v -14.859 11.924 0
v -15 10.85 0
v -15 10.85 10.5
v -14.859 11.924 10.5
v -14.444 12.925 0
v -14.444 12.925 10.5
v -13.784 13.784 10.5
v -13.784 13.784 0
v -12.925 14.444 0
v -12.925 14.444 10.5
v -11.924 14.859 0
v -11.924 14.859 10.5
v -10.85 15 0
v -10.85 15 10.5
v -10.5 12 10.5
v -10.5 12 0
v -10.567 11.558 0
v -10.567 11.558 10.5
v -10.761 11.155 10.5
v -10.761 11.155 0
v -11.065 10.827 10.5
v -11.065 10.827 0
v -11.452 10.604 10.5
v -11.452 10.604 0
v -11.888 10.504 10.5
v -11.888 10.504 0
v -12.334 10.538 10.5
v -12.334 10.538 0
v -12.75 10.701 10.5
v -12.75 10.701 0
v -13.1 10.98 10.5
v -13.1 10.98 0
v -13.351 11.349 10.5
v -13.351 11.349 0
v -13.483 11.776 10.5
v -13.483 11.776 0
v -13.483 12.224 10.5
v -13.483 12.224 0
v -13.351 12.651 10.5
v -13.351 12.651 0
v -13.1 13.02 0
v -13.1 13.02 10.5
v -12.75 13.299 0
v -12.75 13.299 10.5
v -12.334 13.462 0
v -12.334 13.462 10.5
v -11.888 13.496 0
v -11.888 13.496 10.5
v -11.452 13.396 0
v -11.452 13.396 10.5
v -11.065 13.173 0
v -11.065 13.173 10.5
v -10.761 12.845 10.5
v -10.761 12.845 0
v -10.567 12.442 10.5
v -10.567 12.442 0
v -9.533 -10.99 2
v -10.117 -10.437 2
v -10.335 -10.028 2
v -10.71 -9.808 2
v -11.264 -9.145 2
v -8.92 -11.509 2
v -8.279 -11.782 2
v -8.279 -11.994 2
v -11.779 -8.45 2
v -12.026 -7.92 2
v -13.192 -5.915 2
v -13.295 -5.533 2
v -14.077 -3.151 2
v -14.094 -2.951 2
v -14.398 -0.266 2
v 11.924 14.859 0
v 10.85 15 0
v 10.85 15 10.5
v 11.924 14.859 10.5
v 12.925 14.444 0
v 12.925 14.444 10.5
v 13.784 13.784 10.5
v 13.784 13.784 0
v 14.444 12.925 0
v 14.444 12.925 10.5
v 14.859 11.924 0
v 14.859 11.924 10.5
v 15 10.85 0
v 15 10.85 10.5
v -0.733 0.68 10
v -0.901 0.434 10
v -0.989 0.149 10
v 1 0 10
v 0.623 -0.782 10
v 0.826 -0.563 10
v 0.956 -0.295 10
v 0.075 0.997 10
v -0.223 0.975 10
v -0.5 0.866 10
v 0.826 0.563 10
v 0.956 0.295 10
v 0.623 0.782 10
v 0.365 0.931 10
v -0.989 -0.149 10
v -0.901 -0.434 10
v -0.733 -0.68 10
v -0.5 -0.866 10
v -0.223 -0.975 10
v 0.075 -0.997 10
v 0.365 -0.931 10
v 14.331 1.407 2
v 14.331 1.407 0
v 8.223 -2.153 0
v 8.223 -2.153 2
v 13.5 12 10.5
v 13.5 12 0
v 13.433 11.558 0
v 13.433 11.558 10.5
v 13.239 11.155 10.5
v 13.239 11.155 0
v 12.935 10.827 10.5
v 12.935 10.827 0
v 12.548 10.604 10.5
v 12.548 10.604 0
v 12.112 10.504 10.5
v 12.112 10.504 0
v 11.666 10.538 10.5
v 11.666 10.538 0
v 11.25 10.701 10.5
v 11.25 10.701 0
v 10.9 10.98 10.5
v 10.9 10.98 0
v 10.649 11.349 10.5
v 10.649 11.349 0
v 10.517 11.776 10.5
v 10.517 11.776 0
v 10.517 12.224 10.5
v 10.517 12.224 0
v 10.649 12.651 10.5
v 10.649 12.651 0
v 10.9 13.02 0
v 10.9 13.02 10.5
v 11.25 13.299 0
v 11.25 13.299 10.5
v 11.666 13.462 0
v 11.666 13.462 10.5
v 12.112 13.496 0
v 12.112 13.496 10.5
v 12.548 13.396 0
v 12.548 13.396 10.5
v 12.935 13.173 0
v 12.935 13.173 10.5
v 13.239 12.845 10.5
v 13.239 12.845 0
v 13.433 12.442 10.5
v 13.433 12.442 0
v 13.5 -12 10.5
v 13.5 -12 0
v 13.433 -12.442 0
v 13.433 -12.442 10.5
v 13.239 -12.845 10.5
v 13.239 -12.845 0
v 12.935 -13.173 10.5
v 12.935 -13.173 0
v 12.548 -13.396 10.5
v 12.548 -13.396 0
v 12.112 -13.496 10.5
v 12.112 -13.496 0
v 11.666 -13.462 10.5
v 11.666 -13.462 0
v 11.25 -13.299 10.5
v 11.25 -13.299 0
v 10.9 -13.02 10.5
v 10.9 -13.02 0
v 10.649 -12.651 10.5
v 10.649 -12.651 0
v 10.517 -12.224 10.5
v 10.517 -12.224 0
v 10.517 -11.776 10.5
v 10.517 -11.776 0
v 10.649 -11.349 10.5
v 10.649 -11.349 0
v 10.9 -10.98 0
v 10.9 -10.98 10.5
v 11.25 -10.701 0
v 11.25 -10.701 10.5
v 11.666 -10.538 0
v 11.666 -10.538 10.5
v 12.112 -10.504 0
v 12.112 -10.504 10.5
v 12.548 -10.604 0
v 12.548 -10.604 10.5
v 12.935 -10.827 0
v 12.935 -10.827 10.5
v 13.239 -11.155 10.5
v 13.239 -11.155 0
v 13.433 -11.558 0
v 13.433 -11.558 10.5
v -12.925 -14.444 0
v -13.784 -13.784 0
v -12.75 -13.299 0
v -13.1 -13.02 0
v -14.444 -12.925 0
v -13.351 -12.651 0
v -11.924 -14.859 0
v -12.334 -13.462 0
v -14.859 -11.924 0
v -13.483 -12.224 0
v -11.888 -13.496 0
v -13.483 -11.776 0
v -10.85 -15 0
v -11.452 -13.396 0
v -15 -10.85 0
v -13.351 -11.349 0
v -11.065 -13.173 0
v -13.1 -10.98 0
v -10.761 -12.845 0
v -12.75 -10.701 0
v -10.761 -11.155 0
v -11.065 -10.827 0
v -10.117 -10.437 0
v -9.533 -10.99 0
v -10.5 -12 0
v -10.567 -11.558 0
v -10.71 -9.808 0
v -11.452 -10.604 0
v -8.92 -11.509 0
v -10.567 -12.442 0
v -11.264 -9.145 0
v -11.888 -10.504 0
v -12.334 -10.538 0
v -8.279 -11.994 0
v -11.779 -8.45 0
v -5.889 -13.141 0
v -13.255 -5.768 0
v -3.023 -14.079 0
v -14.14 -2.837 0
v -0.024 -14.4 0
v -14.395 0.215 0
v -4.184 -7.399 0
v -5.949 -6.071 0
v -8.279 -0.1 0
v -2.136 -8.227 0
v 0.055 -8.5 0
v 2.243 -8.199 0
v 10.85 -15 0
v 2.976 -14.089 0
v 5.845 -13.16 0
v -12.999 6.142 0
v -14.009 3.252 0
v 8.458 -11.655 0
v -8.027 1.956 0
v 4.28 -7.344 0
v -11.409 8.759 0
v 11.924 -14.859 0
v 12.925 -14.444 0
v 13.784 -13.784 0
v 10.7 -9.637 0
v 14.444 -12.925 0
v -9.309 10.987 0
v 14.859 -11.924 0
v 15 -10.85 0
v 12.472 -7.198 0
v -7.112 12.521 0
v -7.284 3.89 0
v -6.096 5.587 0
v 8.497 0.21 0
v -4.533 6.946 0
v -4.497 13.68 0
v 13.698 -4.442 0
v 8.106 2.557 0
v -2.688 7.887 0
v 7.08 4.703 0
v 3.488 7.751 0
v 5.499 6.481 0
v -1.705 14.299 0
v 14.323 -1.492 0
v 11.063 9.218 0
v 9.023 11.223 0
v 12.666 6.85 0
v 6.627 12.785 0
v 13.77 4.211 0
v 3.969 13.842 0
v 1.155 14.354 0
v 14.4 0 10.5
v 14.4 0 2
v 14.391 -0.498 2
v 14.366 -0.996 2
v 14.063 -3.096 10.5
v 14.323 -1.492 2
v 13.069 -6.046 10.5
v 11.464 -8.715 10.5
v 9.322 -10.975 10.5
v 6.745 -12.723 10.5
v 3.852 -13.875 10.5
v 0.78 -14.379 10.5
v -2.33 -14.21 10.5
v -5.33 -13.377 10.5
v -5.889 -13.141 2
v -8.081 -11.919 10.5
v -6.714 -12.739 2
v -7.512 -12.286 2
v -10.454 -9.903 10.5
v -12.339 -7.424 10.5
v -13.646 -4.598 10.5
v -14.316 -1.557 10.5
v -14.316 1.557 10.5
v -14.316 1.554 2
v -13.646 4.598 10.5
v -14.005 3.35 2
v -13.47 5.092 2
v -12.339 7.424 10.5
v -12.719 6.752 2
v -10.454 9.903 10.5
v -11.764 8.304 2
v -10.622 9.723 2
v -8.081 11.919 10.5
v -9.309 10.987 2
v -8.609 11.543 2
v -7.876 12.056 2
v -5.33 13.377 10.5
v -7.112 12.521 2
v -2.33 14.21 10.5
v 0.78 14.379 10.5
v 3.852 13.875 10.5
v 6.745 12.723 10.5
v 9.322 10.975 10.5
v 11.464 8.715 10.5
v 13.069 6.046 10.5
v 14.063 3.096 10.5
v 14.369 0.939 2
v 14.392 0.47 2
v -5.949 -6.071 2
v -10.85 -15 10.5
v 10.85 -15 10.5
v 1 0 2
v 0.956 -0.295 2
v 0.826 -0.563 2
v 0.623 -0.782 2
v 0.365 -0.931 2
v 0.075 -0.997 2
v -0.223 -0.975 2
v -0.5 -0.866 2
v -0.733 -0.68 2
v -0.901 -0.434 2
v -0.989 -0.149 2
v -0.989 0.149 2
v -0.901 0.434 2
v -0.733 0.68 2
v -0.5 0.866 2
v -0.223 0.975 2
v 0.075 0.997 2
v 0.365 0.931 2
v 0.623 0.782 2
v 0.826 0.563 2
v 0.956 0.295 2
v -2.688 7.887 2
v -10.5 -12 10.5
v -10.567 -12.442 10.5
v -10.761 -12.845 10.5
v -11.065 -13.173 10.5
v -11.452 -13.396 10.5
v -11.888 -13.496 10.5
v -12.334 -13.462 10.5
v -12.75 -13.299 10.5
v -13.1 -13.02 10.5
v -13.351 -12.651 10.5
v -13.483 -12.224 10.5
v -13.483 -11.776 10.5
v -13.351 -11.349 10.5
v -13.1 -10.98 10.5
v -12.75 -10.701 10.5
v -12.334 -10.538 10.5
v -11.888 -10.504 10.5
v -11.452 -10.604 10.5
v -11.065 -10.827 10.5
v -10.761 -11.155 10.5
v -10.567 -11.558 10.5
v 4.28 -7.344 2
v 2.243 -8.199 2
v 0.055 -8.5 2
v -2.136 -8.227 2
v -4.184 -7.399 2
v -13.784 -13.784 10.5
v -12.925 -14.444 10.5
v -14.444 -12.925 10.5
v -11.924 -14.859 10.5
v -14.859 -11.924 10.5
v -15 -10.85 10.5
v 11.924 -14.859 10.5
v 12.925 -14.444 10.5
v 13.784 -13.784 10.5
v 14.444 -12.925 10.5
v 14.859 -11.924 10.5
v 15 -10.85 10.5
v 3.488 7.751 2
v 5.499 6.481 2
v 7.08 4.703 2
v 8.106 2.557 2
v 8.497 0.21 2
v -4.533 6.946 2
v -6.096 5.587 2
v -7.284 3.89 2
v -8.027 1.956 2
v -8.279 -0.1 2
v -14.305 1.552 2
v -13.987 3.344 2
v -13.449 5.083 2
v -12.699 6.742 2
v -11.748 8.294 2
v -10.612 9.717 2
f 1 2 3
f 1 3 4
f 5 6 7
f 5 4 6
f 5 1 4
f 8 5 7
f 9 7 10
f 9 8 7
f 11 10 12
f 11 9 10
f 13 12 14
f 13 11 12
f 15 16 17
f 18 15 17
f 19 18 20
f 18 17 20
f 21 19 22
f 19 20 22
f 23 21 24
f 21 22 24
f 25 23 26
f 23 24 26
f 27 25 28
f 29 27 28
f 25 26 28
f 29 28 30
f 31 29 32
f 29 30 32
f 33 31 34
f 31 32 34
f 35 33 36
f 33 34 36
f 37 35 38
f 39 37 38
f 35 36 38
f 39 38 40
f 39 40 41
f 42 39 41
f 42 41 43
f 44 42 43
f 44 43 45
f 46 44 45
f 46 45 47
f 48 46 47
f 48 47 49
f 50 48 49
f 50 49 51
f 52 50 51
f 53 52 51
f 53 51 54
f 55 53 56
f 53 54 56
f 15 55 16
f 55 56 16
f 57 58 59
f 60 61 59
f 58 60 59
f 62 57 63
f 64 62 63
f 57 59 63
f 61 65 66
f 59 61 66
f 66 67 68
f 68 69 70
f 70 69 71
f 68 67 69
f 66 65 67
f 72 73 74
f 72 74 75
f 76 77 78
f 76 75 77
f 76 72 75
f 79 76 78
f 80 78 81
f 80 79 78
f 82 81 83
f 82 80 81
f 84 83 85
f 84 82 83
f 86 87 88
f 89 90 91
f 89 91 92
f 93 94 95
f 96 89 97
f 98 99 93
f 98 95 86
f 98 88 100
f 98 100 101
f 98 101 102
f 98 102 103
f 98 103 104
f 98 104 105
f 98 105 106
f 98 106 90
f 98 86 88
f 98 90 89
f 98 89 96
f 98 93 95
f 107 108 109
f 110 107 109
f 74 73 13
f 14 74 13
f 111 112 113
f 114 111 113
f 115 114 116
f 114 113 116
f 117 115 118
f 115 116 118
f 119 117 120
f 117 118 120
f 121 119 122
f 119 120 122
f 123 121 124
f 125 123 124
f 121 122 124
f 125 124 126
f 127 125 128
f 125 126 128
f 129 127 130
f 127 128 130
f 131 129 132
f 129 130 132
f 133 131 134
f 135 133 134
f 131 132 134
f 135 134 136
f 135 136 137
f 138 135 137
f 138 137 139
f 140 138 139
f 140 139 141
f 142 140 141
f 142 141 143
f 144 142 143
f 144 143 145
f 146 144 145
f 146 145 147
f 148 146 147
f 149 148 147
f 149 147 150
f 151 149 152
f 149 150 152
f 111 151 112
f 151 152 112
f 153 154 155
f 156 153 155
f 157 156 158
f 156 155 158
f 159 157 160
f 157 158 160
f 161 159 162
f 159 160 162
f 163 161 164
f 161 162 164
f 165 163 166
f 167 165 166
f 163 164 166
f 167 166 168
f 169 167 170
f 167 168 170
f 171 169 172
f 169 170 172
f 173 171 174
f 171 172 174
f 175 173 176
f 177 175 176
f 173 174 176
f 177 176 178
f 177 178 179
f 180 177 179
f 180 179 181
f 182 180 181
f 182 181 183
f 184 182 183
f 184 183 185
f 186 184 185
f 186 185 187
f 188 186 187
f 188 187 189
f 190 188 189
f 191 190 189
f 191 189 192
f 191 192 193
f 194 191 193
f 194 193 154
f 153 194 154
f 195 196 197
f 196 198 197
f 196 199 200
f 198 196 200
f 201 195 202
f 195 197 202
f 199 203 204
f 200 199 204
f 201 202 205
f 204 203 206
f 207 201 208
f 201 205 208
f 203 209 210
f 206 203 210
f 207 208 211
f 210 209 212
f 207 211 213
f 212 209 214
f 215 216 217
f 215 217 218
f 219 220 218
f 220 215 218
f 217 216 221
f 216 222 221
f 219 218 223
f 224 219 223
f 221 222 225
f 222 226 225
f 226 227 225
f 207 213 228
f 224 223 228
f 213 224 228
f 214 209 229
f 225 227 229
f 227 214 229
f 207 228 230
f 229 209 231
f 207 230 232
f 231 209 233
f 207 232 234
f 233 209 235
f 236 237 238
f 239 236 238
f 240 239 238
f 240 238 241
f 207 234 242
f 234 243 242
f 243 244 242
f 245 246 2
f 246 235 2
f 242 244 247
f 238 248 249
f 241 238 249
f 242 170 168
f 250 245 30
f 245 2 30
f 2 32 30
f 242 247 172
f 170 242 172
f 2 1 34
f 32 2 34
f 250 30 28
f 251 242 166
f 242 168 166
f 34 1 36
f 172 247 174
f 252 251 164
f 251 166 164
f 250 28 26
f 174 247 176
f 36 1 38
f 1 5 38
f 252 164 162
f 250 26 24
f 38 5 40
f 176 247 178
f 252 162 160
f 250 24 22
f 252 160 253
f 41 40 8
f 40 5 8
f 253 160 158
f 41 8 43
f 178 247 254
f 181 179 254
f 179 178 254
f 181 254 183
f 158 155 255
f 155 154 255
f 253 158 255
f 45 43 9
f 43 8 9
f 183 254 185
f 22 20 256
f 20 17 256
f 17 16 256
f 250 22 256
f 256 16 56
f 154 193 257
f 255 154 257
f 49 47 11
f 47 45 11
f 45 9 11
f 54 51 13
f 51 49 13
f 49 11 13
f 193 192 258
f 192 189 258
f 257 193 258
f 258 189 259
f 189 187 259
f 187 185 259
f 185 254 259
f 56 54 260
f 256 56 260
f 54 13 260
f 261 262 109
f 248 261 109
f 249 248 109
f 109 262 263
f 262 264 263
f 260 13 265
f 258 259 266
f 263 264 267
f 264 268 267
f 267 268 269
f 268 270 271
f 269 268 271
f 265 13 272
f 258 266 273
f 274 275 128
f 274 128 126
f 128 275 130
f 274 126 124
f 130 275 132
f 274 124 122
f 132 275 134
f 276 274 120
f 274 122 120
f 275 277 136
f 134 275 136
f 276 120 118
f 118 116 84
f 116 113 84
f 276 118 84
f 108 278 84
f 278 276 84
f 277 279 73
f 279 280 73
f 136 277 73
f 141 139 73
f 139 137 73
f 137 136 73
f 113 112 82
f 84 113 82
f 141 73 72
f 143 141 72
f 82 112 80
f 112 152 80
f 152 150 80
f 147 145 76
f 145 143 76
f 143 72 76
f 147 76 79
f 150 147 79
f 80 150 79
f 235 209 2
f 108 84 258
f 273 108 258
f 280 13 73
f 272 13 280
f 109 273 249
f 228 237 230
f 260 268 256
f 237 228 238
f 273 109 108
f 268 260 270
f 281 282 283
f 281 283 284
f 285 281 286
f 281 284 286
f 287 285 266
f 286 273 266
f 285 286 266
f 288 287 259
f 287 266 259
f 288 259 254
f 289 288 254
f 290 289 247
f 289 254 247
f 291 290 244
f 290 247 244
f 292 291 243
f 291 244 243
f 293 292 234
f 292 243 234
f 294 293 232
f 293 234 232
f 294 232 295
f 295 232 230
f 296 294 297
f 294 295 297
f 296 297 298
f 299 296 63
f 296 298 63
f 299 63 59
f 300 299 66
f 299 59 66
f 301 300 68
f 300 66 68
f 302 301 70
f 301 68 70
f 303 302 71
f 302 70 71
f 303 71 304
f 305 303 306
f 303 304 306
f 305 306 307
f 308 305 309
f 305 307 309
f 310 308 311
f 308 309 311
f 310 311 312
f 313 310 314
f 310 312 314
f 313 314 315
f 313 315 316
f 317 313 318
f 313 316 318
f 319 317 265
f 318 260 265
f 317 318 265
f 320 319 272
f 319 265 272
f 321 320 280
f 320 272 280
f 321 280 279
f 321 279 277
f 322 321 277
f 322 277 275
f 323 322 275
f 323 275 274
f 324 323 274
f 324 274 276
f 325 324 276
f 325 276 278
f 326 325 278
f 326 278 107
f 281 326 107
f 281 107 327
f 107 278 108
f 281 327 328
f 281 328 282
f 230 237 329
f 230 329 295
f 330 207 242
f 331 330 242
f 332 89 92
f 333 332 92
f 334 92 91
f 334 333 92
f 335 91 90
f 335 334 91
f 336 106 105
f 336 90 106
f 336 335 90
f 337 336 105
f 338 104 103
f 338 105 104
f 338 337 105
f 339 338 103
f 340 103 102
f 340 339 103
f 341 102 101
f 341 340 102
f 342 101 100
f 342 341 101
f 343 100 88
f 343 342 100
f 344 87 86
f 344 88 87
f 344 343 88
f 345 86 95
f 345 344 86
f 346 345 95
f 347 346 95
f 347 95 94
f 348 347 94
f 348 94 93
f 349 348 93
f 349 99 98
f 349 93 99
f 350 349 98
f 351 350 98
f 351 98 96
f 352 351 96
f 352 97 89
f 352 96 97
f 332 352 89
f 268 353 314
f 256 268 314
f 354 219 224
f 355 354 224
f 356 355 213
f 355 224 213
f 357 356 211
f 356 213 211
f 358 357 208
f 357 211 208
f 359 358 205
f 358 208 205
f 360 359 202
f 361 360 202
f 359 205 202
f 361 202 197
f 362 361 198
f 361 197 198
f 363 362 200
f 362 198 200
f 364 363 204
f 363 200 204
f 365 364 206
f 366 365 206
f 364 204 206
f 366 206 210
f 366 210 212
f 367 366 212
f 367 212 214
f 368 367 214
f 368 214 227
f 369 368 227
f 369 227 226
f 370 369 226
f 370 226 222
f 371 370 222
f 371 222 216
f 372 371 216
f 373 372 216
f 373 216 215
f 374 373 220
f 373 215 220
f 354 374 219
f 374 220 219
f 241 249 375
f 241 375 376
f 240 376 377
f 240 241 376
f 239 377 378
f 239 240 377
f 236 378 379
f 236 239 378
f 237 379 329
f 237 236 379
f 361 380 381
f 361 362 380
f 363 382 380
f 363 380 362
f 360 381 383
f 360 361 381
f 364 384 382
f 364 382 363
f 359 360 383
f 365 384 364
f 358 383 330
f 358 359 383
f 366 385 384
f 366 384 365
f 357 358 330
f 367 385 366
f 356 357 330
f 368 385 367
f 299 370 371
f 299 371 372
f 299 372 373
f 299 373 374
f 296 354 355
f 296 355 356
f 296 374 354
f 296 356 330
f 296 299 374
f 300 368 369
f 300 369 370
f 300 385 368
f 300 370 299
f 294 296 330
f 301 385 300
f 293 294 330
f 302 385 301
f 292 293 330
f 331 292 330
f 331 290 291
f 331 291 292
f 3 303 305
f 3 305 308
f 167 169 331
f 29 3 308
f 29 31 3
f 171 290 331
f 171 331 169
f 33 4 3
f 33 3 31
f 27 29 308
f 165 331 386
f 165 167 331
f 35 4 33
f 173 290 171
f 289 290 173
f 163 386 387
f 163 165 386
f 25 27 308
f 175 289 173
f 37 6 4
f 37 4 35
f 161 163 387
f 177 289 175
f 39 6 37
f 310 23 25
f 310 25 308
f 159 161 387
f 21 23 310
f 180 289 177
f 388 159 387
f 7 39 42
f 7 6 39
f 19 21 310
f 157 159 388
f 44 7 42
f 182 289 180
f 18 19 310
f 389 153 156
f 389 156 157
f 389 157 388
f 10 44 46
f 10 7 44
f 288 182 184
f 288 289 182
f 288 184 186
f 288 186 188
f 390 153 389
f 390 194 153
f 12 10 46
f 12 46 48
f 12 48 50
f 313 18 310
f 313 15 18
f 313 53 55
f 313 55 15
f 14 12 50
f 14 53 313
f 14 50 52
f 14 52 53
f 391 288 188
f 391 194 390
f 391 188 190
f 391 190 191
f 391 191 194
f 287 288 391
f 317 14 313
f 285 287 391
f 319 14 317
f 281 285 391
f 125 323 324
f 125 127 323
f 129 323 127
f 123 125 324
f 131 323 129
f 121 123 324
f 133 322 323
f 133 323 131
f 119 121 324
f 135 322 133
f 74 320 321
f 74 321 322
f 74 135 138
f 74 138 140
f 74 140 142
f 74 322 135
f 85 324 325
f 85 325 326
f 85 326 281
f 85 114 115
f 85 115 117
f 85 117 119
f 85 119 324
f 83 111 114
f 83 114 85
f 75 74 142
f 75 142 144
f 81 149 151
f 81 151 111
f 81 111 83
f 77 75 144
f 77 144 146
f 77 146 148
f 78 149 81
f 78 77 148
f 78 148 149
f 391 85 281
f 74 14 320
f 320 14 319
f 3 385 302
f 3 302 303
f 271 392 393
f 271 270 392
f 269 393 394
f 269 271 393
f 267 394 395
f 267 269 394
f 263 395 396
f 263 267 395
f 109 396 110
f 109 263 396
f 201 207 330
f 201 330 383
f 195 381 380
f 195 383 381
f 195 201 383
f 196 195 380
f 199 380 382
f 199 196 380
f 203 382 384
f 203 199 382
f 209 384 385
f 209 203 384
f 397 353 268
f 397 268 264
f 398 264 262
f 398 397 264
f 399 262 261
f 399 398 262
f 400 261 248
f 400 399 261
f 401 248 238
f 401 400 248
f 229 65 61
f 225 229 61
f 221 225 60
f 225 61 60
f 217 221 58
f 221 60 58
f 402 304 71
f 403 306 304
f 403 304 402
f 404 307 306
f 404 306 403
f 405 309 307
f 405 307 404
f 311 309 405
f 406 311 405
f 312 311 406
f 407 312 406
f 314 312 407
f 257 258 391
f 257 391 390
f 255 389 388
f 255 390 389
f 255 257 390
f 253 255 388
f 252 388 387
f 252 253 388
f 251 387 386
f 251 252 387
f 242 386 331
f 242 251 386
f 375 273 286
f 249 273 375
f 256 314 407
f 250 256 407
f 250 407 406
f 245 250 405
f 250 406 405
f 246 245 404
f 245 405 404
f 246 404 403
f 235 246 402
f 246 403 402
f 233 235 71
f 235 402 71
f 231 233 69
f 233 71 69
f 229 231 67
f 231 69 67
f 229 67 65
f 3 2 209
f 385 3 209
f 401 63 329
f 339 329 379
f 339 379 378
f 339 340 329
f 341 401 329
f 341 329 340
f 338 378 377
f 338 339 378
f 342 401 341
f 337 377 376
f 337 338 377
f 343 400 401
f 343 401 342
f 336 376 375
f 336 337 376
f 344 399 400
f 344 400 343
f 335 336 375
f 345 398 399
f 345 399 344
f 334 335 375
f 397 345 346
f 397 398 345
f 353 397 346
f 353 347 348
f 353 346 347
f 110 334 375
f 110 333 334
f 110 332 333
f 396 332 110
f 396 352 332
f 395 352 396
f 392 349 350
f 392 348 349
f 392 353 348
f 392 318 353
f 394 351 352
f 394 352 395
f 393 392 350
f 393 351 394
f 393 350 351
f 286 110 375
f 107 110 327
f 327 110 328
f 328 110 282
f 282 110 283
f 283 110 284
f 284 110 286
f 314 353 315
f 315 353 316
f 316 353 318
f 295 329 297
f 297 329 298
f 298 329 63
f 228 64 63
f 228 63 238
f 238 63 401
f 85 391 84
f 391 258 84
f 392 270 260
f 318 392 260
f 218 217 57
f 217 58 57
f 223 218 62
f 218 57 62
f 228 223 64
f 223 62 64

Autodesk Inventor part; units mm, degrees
ref_plane "YZ Plane" through (0, 0, 0) normal (1, 0, 0) x (0, 1, 0)
ref_plane "XZ Plane" through (0, 0, 0) normal (0, 1, 0) x (-1, 0, 0)
ref_plane "XY Plane" through (0, 0, 0) normal (0, 0, 1) x (1, 0, 0)
sketch "Эскиз1" plane through (0, 0, 0) normal (0, 0, 1) x (1, 0, 0)
  line L0 (0, 0) -> (0, 15) construction
  line L1 (0, 0) -> (-22.981013, 0) construction
  line L2 (10.85, 15) -> (-10.85, 15)
  line L3 (-15, 10.85) -> (-15, -10.85)
  line L4 (-10.85, -15) -> (10.85, -15)
  line L5 (15, -10.85) -> (15, 10.85)
  line L6 (15, 15) -> (-15, -15) construction
  line L7 (-15, 15) -> (15, -15) construction
  circle A0 centre (0, 0) radius 14.4
  line L8 (-12, -12) -> (12, -12) construction
  line L9 (12, -12) -> (12, 12) construction
  line L10 (12, 12) -> (-12, 12) construction
  line L11 (-12, 12) -> (-12, -12) construction
  line L12 (-12, -12) -> (12, 12) construction
  line L13 (12, -12) -> (-12, 12) construction
  circle A1 centre (12, 12) radius 1.5
  circle A2 centre (-12, 12) radius 1.5
  circle A3 centre (-12, -12) radius 1.5
  circle A4 centre (12, -12) radius 1.5
  arc A5 (15, 10.85) -> (10.85, 15) centre (10.85, 10.85) ccw
  arc A6 (-10.85, 15) -> (-15, 10.85) centre (-10.85, 10.85) ccw
  arc A7 (-15, -10.85) -> (-10.85, -15) centre (-10.85, -10.85) ccw
  arc A8 (10.85, -15) -> (15, -10.85) centre (10.85, -10.85) ccw
  line L14 (0, 0) -> (26.197647, 0) construction
  line L15 (14.322508, -1.491896) -> (4.279514, -7.344097)
  line L16 (14.331135, 1.406612) -> (8.222871, -2.152764)
  line L17 (14.4, 0) -> (7.870044, -3.805102) construction
  line L18 (-7.13266, -13.861758) -> (-7.204633, -5.378159) construction
  line L19 (-8.370965, 11.716951) -> (-0.710884, 8.270069) construction
  line L20 (-8.401084, -11.695375) -> (-8.500306, 0)
  line L21 (-5.948706, -6.071482) -> (-5.888731, -13.140885)
  line L22 (3.48797, 7.751391) -> (-7.111996, 12.521162)
  line L23 (-3.02844, 7.942201) -> (-9.475461, 10.84323)
  arc A9 (8.222871, -2.152764) -> (3.48797, 7.751391) centre (0, 0) ccw
  arc A10 (-3.02844, 7.942201) -> (-8.5, 0) centre (0, 0) ccw
  arc A11 (-5.948706, -6.071482) -> (4.279514, -7.344097) centre (0, 0) ccw
  arc A12 (14.322508, -1.491896) -> (14.331135, 1.406612) centre (0, 0) ccw
  arc A13 (-8.401084, -11.695375) -> (-5.888731, -13.140885) centre (0, 0) ccw
  arc A14 (-7.111996, 12.521162) -> (-9.475461, 10.84323) centre (0, 0) ccw
  arc A15 (14.322508, -1.491896) -> (14.331135, 1.406612) centre (0, 0) ccw
  arc A16 (-9.475461, 10.84323) -> (-8.401084, -11.695375) centre (0, 0) ccw
  line L24 (-9.475461, 10.84323) -> (-3.02844, 7.942201)
  line L25 (-8.500306, 0) -> (-8.401084, -11.695375)
  line L26 (-5.948706, -6.071482) -> (-5.888731, -13.140885)
  arc A17 (-8.401084, -11.695375) -> (-5.888731, -13.140885) centre (0, 0) ccw
  arc A18 (-9.475461, 10.84323) -> (-5.888731, -13.140885) centre (0, 0) ccw
  arc A19 (-7.111996, 12.521162) -> (-8.401084, -11.695375) centre (0, 0) ccw
  point P0 (-0.367875, -0.714936)
  dimension "d24" = 360
  dimension "d52" = 28.8
  dimension "d0" = 30
  dimension "d1" = 30
  dimension "d8" = 3
  dimension "d9" = 3
  dimension "d10" = 3
  dimension "d11" = 3
  dimension "d19" = 2.5
  dimension "d26" = 1.25
  dimension "d27" = 2.5
  dimension "d28" = 1.25
  dimension "d32" = 2.5
  dimension "d33" = 1.25
  dimension "d49" = 8.5
  dimension "d50" = 8.5
  dimension "d51" = 8.5
  dimension "d53" = 24
extrude "Выдавливание2" add sketch "Эскиз1" along normal blind 10.5 contours A5 L5 A8 L4 A7 L3 A6 L2 | A1 | A2 | A3 | A4
extrude "Выдавливание3" add sketch "Эскиз1" along normal blind 2 contours A0 L15 A11 L21 L20 A10 L23 L22 A9 L16 | L23 A10 L20 A0
sketch "Эскиз2" plane through (0, 0, 2) normal (0, 0, 1) x (1, 0, 0)
  circle A0 centre (0, 0) radius 1
  dimension "d45" = 2
extrude "Выдавливание6" add sketch "Эскиз2" along normal blind 8
sketch "Эскиз3" plane through (0, 0, 2) normal (0, 0, 1) x (1, 0, 0)
  line L0 (0.220979, -0.099936) -> (0.220979, 15) construction
  line L1 (0.220979, -0.099936) -> (-22.981013, -0.099936) construction
  line L2 (10.85, 14.900064) -> (-10.408041, 14.900064)
  line L3 (-14.779021, 10.529085) -> (-14.779021, -10.728956)
  line L4 (-10.408041, -15.099936) -> (10.85, -15.099936)
  line L5 (15.220979, -10.728956) -> (15.220979, 10.529085)
  line L6 (15.220979, 14.900064) -> (-14.779021, -15.099936) construction
  line L7 (-14.779021, 14.900064) -> (15.220979, -15.099936) construction
  line L8 (-11.779021, -12.099936) -> (12.220979, -12.099936) construction
  line L9 (12.220979, -12.099936) -> (12.220979, 11.900064) construction
  line L10 (12.220979, 11.900064) -> (-11.779021, 11.900064) construction
  line L11 (-11.779021, 11.900064) -> (-11.779021, -12.099936) construction
  line L12 (-11.779021, -12.099936) -> (12.220979, 11.900064) construction
  line L13 (12.220979, -12.099936) -> (-11.779021, 11.900064) construction
  circle A0 centre (12.220979, 11.900064) radius 1.75
  circle A1 centre (-11.779021, 11.900064) radius 1.75
  circle A2 centre (-11.779021, -12.099936) radius 1.75
  circle A3 centre (12.220979, -12.099936) radius 1.75
  arc A4 (15.220979, 10.529085) -> (10.85, 14.900064) centre (10.85, 10.529085) ccw
  arc A5 (-10.408041, 14.900064) -> (-14.779021, 10.529085) centre (-10.408041, 10.529085) ccw
  arc A6 (-14.779021, -10.728956) -> (-10.408041, -15.099936) centre (-10.408041, -10.728956) ccw
  arc A7 (10.85, -15.099936) -> (15.220979, -10.728956) centre (10.85, -10.728956) ccw
  line L14 (0.220979, -0.099936) -> (26.197647, -0.099936) construction
  line L15 (14.765082, -1.58245) -> (4.43625, -7.481094)
  line L16 (14.773156, 1.301112) -> (8.424753, -2.324366)
  line L17 (14.840445, -0.099936) -> (7.933925, -4.044147) construction
  line L18 (-7.029021, -14.080975) -> (-7.029021, -5.340351) construction
  line L19 (-8.202223, 11.849057) -> (-0.585826, 8.283092) construction
  line L20 (-8.279021, -11.994421) -> (-8.279021, -0.099936)
  line L21 (-5.779021, -6.120733) -> (-5.779021, -13.431431)
  line L22 (3.825169, 7.598104) -> (-6.947092, 12.641631)
  line L23 (-2.687632, 7.886927) -> (-9.308579, 10.986827)
  arc A8 (8.424753, -2.324366) -> (3.825169, 7.598104) centre (0.220979, -0.099936) ccw
  arc A9 (-2.687632, 7.886927) -> (-8.279021, -0.099936) centre (0.220979, -0.099936) ccw
  arc A10 (-5.779021, -6.120733) -> (4.43625, -7.481094) centre (0.220979, -0.099936) ccw
  arc A11 (14.765082, -1.58245) -> (14.773156, 1.301112) centre (0.441536, -0.100553) ccw
  arc A12 (-6.947092, 12.641631) -> (-8.202223, 11.849057) centre (0.103647, 0.085873) ccw
  arc A13 (14.765082, -1.58245) -> (14.773156, 1.301112) centre (0.441536, -0.100553) ccw
  line L24 (-9.308579, 10.986827) -> (-2.687632, 7.886927)
  line L25 (-8.279021, -0.099936) -> (-8.279021, -11.994421)
  line L26 (-5.779021, -6.120733) -> (-5.779021, -13.431431)
  arc A14 (-6.947092, 12.641631) -> (-8.202223, 11.849057) centre (0.220979, -0.099936) ccw
  arc A15 (-9.308579, 10.986827) -> (-8.279021, -11.994421) centre (0.220979, -0.099936) ccw
  arc A16 (-10.116544, -10.437459) -> (-7.029021, -12.795064) centre (0.220979, -0.099936) ccw
  arc A17 (-7.029021, -12.795064) -> (-5.779021, -13.431431) centre (0.220979, -0.099936) ccw
  arc A18 (-7.029021, -12.795064) -> (-8.202223, 11.849057) centre (0.220979, -0.099936) ccw
  arc A19 (-7.029021, -12.795064) -> (-5.779021, -13.431431) centre (0.121294, -0.295744) ccw
  arc A20 (-11.779021, -8.450312) -> (-5.779021, -13.431431) centre (0.220979, -0.099936) ccw
  arc A21 (-7.029021, -12.795064) -> (-5.779021, -13.431431) centre (0.220979, -0.099936) ccw
  circle A22 centre (0, 0) radius 14.4
  point P0 (-0.130266, -0.777285)
  dimension "d73" = 360
  dimension "d56" = 30
  dimension "d57" = 30
  dimension "d58" = 3.5
  dimension "d59" = 3.5
  dimension "d60" = 3.5
  dimension "d61" = 3.5
  dimension "d62" = 2.5
  dimension "d63" = 1.25
  dimension "d64" = 2.5
  dimension "d65" = 1.25
  dimension "d66" = 2.5
  dimension "d67" = 1.25
  dimension "d68" = 8.5
  dimension "d69" = 8.5
  dimension "d70" = 8.5
  dimension "d72" = 24
  dimension "d78" = 14.61947
sketch "Эскиз3 outline for Выдавливание7" plane through (0, 0, 2) normal (0, 0, 1) x (1, 0, 0)
  line L0 (-8.279021, -11.994421) -> (-8.279021, -0.099936)
  arc A0 (-10.116544, -10.437459) -> (-8.279021, -11.994421) centre (0.220979, -0.099936) ccw
  arc A1 (-11.779021, -8.450312) -> (-10.116544, -10.437459) centre (0.220979, -0.099936) ccw
  arc A2 (-9.308579, 10.986827) -> (-11.779021, -8.450312) centre (0.220979, -0.099936) ccw
  line L1 (-2.687632, 7.886927) -> (-9.308579, 10.986827)
  arc A3 (-8.279021, -0.099936) -> (-2.687632, 7.886927) centre (0.220979, -0.099936) cw
extrude "Выдавливание7" cut sketch "Эскиз3 outline for Выдавливание7" against normal blind 10
extrude "Выдавливание8" cut sketch "Эскиз1" along normal blind 20 contours A1 | A2 | A3 | A4
properties part number "кулер корпус"
